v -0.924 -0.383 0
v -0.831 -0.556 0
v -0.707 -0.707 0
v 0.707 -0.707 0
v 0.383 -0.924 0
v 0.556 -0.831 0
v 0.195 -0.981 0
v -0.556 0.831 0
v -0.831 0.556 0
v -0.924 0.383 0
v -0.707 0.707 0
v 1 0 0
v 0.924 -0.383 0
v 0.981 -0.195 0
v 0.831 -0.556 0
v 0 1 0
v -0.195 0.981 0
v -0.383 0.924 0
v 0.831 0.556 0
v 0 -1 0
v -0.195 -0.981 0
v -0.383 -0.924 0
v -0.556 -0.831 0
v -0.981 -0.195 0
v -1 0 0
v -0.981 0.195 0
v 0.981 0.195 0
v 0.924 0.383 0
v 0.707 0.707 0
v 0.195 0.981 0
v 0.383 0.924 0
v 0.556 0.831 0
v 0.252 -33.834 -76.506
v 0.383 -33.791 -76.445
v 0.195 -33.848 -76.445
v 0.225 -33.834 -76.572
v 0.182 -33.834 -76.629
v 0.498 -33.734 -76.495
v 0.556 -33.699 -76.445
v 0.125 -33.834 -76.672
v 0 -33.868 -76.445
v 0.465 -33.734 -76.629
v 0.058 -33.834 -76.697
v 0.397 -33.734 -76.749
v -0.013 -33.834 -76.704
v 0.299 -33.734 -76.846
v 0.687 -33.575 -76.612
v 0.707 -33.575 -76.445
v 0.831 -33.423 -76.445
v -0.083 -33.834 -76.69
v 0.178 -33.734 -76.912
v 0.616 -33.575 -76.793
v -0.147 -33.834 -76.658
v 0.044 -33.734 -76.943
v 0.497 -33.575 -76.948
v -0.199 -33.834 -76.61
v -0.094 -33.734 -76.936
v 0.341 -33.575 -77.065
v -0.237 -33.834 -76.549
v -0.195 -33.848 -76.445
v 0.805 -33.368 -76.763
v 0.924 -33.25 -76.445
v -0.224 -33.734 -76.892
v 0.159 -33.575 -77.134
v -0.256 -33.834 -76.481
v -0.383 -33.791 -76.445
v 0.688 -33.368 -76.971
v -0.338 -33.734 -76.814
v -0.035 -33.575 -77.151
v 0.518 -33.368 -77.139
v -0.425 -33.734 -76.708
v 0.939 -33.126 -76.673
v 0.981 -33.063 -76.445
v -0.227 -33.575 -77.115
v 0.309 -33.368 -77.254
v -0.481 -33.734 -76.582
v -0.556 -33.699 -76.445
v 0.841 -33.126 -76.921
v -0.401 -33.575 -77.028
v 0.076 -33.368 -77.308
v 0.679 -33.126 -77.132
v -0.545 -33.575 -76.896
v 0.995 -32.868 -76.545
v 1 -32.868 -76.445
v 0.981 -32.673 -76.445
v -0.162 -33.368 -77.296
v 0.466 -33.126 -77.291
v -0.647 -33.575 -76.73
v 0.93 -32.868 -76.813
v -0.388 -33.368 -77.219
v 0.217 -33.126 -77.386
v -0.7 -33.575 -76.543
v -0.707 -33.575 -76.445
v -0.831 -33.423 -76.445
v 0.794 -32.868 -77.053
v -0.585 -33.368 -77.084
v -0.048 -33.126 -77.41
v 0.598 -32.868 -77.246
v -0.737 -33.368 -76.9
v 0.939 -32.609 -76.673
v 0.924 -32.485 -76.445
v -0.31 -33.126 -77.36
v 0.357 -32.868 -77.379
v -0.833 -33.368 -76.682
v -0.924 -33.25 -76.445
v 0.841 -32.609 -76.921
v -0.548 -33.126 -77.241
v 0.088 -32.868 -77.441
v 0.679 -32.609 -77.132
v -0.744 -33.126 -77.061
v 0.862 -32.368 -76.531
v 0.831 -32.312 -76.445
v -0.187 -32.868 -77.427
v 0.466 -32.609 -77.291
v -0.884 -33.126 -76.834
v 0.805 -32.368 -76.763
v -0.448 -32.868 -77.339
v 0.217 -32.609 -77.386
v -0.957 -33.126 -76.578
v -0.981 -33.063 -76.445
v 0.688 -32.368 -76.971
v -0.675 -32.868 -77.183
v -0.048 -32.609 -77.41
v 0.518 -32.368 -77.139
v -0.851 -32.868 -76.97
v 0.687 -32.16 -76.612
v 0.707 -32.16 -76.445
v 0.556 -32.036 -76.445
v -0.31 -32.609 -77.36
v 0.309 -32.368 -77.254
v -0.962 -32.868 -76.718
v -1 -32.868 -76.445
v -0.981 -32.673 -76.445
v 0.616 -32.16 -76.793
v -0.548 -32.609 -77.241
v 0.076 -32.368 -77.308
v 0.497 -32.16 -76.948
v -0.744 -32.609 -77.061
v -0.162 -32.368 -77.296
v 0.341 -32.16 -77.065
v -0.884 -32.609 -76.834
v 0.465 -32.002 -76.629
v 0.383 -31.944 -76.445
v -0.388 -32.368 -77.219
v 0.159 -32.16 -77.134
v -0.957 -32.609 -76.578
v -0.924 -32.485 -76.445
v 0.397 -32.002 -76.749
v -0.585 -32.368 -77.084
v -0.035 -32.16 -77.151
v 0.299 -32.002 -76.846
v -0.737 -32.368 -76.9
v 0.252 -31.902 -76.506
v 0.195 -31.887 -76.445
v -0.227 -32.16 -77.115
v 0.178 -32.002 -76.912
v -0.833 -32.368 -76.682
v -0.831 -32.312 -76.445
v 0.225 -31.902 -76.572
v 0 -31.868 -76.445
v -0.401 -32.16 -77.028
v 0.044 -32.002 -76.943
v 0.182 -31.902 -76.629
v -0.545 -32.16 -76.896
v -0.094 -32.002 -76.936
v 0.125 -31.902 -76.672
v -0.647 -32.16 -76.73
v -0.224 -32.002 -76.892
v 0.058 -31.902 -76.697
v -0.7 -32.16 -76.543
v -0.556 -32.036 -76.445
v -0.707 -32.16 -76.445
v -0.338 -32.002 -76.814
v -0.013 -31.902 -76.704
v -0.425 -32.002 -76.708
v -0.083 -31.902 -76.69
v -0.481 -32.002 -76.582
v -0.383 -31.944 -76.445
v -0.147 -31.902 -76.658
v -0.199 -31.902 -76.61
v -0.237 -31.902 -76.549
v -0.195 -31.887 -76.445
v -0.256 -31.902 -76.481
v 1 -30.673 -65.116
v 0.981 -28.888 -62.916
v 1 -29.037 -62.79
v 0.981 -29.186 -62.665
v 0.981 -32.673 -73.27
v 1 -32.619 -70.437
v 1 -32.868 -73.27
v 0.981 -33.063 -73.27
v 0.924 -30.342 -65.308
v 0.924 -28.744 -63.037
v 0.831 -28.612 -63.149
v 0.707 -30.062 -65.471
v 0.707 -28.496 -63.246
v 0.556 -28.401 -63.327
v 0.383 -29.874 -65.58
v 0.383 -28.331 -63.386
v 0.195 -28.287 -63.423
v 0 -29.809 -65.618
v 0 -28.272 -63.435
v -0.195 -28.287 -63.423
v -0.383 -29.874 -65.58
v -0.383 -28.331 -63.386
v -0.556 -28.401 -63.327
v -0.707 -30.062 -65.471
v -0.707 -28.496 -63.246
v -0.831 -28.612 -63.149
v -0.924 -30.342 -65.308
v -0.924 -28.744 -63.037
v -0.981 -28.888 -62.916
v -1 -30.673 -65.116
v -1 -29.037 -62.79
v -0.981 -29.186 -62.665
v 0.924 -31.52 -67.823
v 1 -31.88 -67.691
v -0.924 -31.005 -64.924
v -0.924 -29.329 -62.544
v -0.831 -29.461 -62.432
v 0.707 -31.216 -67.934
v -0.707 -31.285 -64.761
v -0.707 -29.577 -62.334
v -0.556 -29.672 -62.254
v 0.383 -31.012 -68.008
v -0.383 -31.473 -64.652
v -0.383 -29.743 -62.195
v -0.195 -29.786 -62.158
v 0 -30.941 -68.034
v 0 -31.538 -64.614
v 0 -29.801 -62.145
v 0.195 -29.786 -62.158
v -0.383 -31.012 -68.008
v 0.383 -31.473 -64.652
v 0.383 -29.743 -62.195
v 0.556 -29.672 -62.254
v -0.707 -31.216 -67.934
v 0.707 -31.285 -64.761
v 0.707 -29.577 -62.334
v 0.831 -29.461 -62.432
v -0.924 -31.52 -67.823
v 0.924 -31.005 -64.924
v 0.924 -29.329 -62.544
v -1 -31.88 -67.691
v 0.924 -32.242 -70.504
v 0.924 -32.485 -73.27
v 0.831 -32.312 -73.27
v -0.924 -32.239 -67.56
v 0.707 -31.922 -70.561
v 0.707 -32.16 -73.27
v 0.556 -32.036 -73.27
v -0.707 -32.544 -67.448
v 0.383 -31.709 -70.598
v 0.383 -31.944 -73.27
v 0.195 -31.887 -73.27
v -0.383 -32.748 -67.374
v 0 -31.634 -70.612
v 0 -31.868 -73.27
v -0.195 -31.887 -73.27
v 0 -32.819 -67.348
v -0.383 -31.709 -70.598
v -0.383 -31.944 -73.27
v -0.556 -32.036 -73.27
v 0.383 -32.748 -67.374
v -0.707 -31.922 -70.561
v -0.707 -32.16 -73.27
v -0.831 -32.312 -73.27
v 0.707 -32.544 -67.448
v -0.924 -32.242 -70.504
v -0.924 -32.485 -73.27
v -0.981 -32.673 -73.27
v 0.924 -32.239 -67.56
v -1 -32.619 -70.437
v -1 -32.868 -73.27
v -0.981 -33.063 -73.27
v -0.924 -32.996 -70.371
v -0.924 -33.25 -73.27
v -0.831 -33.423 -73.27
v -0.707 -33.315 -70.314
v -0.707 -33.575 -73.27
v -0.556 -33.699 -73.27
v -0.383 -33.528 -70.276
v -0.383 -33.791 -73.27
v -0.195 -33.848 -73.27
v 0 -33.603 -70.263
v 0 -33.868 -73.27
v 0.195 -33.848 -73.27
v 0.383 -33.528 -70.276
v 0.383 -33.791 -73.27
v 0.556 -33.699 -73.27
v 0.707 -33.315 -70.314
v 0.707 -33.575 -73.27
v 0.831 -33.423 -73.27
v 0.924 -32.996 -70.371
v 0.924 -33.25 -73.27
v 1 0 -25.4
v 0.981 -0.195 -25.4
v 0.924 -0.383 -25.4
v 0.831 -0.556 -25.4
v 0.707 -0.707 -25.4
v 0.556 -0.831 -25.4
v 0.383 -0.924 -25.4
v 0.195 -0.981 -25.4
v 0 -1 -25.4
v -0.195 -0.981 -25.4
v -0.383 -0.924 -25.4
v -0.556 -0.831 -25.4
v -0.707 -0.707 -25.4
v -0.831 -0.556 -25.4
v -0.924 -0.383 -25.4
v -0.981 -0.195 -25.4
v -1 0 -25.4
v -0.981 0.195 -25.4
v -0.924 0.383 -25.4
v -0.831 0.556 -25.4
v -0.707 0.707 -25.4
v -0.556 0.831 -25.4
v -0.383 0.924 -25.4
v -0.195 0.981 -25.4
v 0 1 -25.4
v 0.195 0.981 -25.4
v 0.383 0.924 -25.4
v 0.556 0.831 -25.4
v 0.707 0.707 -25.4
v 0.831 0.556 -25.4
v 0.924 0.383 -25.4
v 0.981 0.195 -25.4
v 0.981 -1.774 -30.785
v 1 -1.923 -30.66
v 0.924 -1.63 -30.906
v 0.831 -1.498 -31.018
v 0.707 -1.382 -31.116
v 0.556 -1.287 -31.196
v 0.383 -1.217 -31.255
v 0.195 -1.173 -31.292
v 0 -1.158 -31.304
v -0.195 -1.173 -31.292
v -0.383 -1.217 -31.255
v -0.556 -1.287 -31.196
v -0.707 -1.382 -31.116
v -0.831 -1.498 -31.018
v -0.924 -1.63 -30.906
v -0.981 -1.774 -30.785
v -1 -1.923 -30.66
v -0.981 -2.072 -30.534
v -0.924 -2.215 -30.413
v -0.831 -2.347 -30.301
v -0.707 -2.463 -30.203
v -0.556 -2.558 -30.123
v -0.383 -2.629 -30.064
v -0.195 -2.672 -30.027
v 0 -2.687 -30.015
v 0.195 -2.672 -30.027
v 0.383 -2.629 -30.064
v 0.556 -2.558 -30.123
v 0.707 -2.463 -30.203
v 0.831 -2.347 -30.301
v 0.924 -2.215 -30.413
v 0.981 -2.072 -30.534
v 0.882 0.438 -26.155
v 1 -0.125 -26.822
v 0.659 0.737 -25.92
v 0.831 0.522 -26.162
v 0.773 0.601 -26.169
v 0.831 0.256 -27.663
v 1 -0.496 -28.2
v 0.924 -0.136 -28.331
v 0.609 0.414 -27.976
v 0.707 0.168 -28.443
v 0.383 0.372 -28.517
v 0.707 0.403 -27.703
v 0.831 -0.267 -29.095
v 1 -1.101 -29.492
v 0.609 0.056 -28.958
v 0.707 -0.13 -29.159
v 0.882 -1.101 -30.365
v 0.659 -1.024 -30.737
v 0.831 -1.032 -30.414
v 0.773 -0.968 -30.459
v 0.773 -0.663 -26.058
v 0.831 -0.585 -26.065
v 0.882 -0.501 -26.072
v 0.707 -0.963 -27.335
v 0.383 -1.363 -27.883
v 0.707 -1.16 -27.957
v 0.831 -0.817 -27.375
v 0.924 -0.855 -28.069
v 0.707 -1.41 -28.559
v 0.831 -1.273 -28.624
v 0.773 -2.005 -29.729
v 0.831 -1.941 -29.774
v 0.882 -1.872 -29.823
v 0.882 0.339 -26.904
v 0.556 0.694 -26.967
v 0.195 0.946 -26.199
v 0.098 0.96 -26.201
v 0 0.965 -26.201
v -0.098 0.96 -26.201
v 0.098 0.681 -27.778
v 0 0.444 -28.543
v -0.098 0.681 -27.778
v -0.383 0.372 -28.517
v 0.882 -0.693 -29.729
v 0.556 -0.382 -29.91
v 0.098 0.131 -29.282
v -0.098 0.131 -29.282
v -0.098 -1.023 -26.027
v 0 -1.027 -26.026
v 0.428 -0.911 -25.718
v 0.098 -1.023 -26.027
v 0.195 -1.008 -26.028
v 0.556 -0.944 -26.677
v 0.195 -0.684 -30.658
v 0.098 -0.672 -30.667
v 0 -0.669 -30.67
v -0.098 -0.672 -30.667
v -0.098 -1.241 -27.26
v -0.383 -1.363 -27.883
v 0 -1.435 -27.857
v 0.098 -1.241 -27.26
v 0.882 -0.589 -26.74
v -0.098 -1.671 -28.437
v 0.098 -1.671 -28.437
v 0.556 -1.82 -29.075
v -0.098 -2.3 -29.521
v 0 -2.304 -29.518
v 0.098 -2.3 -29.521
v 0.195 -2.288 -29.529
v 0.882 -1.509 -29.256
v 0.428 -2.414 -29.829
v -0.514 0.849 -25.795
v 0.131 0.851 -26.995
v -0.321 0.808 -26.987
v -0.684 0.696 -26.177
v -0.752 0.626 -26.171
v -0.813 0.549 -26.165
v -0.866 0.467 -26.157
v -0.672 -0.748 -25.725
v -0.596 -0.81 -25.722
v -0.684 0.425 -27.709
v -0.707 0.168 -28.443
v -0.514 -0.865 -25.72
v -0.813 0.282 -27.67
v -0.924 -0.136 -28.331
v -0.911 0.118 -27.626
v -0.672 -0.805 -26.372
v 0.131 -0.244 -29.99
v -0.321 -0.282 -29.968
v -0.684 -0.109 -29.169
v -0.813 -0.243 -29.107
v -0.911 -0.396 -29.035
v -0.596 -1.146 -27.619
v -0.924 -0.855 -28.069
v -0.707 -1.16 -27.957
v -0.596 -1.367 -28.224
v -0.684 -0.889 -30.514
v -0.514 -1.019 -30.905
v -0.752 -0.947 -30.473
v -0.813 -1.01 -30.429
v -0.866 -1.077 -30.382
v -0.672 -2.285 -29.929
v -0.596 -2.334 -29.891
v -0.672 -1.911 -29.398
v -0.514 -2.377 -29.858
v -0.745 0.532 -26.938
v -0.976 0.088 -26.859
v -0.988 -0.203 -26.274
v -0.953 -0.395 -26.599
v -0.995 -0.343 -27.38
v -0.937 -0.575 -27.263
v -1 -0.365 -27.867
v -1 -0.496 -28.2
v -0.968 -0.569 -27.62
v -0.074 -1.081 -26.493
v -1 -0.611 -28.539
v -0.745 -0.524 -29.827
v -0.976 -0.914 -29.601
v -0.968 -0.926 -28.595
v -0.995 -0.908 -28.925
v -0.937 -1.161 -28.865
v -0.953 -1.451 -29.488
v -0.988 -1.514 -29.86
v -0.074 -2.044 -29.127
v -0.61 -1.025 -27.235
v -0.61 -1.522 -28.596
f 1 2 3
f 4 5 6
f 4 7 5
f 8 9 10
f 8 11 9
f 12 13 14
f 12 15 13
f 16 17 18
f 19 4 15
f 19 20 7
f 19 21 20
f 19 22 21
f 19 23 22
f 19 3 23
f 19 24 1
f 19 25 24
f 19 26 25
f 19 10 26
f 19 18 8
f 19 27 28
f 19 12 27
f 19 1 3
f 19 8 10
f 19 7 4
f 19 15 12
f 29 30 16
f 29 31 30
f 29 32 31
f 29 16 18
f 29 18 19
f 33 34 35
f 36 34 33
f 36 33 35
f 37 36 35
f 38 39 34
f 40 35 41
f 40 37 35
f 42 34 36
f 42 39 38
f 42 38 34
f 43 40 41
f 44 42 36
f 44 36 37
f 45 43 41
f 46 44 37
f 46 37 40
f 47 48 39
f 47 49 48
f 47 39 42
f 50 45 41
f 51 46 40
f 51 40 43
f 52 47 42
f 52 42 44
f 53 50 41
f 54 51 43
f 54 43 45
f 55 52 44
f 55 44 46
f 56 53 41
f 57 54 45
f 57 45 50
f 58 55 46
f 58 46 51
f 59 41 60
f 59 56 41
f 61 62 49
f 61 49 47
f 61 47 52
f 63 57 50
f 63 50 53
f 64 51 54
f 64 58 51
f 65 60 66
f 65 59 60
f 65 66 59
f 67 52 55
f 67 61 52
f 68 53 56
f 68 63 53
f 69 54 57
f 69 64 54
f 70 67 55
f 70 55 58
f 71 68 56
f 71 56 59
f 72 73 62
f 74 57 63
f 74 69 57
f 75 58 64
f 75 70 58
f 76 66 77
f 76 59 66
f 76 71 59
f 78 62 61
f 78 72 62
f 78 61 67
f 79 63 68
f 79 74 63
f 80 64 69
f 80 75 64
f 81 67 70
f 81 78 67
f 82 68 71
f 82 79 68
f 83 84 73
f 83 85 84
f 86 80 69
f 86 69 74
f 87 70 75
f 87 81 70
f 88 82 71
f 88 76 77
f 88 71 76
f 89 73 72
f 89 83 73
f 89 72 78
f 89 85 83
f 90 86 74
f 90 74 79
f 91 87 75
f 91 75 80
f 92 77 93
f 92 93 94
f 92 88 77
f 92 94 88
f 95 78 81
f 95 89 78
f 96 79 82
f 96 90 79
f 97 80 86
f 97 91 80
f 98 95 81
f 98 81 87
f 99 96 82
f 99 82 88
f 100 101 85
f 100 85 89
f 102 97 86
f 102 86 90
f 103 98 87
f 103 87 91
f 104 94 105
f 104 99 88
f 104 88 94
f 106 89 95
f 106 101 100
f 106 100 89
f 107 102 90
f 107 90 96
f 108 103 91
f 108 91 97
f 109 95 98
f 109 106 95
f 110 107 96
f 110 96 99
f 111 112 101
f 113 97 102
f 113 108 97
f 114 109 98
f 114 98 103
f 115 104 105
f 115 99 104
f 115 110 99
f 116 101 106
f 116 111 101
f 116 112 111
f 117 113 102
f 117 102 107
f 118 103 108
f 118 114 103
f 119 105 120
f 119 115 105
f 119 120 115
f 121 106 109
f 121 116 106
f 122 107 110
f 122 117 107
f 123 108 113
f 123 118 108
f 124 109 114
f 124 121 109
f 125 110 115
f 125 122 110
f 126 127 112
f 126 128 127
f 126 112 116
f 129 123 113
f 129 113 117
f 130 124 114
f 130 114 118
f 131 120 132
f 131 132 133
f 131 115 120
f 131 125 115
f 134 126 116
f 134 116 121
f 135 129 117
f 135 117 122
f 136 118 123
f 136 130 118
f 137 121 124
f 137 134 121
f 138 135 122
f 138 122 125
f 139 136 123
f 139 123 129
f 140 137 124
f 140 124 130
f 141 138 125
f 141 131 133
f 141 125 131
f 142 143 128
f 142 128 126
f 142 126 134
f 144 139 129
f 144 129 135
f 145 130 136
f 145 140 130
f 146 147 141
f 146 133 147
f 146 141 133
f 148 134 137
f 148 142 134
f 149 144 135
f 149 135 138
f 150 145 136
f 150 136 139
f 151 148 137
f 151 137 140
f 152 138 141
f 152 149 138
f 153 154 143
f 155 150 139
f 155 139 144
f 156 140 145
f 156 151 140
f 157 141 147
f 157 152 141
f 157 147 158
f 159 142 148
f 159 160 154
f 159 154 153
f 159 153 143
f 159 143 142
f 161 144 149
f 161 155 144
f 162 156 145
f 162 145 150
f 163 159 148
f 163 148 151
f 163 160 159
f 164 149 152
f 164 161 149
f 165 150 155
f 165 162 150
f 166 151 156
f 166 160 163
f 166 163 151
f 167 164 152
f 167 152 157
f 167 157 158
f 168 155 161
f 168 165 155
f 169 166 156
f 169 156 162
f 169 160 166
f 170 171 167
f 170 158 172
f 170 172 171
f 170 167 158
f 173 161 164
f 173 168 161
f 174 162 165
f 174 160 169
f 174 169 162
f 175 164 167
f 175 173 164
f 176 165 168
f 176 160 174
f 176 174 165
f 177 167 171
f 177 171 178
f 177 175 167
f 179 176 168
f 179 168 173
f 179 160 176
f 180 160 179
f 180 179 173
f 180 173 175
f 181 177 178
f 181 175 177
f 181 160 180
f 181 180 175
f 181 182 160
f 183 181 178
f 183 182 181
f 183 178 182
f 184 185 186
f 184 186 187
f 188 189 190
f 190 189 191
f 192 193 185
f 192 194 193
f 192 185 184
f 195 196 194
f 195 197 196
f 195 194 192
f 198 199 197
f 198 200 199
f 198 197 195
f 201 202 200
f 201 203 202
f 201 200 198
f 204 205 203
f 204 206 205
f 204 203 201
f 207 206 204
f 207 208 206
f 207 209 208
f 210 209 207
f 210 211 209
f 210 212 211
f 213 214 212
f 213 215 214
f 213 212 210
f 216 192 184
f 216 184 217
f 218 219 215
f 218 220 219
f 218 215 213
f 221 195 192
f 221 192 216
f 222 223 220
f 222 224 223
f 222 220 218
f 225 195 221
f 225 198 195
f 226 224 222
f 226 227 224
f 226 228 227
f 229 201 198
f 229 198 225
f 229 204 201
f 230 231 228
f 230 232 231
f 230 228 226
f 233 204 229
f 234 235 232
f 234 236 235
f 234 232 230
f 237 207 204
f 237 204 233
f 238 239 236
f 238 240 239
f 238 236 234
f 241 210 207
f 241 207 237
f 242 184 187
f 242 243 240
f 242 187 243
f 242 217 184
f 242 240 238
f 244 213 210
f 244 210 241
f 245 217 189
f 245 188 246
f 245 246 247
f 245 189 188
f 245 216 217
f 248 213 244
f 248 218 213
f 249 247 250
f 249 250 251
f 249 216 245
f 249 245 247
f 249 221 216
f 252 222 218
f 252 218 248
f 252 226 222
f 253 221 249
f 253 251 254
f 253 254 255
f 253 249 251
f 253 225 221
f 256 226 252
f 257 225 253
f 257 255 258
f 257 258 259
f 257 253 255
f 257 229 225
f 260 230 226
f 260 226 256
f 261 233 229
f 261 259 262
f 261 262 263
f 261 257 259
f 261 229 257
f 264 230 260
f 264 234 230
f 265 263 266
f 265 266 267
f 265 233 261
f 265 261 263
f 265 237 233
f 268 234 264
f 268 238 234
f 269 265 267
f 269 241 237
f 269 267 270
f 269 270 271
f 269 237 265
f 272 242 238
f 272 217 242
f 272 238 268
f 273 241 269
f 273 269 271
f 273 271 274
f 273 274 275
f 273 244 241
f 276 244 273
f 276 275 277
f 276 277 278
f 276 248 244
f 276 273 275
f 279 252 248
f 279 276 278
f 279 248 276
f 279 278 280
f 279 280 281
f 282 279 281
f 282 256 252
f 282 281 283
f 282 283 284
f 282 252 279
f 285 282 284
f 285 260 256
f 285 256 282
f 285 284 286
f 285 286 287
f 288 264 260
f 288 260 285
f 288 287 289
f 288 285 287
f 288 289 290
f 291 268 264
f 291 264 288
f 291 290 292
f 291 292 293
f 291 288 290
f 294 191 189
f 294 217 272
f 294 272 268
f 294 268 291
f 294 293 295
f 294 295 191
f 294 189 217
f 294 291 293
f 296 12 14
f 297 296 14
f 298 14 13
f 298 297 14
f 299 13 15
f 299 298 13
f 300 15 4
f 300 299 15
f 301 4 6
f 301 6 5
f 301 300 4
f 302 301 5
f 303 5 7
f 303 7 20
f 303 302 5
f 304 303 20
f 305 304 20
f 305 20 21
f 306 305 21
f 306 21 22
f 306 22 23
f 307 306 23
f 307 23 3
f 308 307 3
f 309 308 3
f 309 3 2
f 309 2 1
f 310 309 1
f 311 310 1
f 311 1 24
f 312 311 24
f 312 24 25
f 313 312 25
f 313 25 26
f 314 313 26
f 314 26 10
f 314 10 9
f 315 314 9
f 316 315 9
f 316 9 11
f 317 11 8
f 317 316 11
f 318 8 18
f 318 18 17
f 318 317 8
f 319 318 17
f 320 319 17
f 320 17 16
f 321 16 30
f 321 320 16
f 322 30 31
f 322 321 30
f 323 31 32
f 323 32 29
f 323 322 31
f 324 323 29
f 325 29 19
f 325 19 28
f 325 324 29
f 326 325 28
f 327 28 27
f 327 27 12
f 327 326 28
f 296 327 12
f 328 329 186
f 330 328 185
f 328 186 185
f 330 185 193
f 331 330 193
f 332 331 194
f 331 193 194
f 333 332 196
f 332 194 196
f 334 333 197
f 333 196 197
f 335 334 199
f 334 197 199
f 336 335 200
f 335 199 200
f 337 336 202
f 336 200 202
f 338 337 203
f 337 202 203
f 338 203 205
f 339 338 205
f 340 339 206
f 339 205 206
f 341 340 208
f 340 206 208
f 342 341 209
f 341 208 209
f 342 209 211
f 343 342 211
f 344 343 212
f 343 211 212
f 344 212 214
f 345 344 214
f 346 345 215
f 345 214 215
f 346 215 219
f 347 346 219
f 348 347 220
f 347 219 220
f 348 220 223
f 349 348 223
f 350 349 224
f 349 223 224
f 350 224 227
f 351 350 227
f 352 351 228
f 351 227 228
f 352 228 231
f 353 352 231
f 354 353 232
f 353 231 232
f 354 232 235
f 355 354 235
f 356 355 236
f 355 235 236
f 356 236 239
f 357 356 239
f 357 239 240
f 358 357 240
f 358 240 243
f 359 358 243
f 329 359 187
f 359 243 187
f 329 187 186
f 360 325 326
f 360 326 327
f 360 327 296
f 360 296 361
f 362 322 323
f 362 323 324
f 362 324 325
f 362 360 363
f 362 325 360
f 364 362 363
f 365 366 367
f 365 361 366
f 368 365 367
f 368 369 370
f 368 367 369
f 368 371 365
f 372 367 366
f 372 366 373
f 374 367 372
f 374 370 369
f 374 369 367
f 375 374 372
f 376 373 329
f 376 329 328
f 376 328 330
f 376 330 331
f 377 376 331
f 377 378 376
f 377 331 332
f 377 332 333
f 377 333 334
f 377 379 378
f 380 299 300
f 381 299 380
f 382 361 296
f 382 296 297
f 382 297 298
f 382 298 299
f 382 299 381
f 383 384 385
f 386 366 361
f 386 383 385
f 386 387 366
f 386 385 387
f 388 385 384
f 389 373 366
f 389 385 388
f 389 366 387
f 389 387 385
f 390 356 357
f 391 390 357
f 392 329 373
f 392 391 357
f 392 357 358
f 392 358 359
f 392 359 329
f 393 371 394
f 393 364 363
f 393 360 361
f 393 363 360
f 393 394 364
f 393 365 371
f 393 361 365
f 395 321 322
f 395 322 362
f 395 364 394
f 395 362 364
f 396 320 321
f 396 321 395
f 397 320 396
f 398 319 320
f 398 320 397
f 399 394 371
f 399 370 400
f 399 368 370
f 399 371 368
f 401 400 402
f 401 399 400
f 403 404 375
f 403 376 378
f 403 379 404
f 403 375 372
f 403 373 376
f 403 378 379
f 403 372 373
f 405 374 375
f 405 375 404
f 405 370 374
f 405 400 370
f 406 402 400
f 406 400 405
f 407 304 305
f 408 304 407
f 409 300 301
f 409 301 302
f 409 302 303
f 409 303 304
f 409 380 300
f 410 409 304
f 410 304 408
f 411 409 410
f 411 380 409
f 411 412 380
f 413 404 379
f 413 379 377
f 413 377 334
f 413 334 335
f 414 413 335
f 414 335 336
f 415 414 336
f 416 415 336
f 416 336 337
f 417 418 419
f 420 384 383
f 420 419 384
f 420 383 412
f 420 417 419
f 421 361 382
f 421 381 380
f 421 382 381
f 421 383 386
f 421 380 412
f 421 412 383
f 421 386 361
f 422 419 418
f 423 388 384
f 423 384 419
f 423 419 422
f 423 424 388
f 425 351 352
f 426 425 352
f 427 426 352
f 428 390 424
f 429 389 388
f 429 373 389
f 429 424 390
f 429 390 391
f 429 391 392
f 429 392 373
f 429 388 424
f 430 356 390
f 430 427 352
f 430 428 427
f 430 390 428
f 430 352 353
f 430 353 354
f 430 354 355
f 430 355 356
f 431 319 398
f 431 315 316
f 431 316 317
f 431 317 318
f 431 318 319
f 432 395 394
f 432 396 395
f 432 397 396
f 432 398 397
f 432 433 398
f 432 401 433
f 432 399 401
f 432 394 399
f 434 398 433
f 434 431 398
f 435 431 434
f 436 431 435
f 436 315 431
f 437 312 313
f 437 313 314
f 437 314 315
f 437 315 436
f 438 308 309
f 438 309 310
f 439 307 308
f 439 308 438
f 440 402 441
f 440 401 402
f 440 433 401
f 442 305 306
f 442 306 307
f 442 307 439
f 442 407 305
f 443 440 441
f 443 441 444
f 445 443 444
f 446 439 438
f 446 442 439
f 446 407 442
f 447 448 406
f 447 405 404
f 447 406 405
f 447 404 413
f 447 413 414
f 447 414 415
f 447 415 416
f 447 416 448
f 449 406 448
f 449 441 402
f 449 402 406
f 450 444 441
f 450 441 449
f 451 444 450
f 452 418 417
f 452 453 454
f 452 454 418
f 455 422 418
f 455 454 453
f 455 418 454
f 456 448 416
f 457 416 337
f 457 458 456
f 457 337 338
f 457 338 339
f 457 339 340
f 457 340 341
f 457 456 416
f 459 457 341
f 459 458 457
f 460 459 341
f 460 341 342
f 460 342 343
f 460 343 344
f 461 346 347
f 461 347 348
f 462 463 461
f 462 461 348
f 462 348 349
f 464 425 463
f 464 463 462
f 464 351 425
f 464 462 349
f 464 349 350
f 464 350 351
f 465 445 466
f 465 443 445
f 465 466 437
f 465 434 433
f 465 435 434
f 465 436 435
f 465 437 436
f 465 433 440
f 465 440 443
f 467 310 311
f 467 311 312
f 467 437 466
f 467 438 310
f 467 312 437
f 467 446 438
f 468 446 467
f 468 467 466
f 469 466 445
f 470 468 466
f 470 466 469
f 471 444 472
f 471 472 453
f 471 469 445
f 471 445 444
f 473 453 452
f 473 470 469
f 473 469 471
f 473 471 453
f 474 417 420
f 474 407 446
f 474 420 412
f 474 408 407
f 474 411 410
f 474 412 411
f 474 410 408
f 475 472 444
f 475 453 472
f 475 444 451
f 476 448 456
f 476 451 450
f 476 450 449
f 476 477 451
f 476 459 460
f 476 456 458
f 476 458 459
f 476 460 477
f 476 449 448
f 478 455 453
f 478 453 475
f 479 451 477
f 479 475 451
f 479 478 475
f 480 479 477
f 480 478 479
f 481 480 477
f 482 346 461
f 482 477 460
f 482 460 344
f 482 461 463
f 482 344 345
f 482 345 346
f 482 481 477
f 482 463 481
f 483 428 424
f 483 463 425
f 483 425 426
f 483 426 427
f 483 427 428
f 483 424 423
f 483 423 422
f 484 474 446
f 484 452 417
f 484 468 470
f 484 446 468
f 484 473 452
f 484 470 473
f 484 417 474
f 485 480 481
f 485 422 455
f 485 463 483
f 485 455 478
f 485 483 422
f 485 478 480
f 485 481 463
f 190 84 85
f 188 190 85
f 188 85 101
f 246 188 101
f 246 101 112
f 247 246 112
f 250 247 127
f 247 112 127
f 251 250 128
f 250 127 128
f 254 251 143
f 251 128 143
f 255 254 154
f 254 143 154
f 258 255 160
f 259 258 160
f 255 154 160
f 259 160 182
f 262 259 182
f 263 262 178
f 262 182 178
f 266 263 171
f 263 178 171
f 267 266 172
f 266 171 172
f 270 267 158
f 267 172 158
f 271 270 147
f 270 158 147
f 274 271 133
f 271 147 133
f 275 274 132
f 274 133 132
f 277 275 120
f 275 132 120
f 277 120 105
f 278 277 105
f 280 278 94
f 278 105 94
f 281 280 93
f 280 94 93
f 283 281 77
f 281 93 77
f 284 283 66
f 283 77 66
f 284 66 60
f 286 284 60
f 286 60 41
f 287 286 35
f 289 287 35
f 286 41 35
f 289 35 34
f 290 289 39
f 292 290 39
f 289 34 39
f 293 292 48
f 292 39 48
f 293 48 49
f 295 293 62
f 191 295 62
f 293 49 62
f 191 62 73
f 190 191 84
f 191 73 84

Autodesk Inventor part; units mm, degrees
ref_plane "YZ Plane" through (0, 0, 0) normal (1, 0, 0) x (0, 1, 0)
ref_plane "XZ Plane" through (0, 0, 0) normal (0, 1, 0) x (-1, 0, 0)
ref_plane "XY Plane" through (0, 0, 0) normal (0, 0, 1) x (1, 0, 0)
sketch "Sketch2" plane through (0, 0, 0) normal (1, 0, 0) x (0, 1, 0)
  line L0 (0, 0) -> (0, -25.4)
  arc A0 (-1.9226, -30.6595) -> (0, -25.4) centre (-8.1552, -25.4) ccw
  line L1 (-1.9226, -30.6595) -> (-29.0367, -62.7904)
  arc A1 (-29.0367, -62.7904) -> (-32.8676, -73.2701) centre (-16.618, -73.2701) ccw
  line L2 (-32.8676, -73.2701) -> (-32.8676, -76.4451)
  dimension "d3" = 25.4
  dimension "d4" = 8.1552
  dimension "d5" = 16.2496
  dimension "d6" = 3.175
  dimension "d7" = 32.8676
sketch "Sketch3" plane through (0, 0, 0) normal (0, 0, 1) x (1, 0, 0)
  circle A0 centre (0, 0) radius 1
  dimension "d8" = 2
sweep "Sweep1" add profiles "Sketch3" path "Sketch2"
sketch "Sketch9" plane through (0, 0, 0) normal (1, 0, 0) x (0, 1, 0)
  line L0 (-33.8676, -76.4451) -> (-31.8676, -76.4451) projected
  arc A0 (-33.8676, -76.4451) -> (-31.8676, -76.4451) centre (-32.8676, -76.4451) ccw
  line L1 (-31.8676, -73.2701) -> (-31.8676, -76.4451) projected
  line L2 (-31.8676, -76.4451) -> (-33.8676, -76.4451)
  point P0 (0, 0)
revolve "Revolution2" add sketch "Sketch9" angle 180 mid plane about axis through (0, -33.8676, -76.4451) along (0, 1, 0)
properties part number "2mmToDive" material "Brass, Soft Yellow, Welded"
